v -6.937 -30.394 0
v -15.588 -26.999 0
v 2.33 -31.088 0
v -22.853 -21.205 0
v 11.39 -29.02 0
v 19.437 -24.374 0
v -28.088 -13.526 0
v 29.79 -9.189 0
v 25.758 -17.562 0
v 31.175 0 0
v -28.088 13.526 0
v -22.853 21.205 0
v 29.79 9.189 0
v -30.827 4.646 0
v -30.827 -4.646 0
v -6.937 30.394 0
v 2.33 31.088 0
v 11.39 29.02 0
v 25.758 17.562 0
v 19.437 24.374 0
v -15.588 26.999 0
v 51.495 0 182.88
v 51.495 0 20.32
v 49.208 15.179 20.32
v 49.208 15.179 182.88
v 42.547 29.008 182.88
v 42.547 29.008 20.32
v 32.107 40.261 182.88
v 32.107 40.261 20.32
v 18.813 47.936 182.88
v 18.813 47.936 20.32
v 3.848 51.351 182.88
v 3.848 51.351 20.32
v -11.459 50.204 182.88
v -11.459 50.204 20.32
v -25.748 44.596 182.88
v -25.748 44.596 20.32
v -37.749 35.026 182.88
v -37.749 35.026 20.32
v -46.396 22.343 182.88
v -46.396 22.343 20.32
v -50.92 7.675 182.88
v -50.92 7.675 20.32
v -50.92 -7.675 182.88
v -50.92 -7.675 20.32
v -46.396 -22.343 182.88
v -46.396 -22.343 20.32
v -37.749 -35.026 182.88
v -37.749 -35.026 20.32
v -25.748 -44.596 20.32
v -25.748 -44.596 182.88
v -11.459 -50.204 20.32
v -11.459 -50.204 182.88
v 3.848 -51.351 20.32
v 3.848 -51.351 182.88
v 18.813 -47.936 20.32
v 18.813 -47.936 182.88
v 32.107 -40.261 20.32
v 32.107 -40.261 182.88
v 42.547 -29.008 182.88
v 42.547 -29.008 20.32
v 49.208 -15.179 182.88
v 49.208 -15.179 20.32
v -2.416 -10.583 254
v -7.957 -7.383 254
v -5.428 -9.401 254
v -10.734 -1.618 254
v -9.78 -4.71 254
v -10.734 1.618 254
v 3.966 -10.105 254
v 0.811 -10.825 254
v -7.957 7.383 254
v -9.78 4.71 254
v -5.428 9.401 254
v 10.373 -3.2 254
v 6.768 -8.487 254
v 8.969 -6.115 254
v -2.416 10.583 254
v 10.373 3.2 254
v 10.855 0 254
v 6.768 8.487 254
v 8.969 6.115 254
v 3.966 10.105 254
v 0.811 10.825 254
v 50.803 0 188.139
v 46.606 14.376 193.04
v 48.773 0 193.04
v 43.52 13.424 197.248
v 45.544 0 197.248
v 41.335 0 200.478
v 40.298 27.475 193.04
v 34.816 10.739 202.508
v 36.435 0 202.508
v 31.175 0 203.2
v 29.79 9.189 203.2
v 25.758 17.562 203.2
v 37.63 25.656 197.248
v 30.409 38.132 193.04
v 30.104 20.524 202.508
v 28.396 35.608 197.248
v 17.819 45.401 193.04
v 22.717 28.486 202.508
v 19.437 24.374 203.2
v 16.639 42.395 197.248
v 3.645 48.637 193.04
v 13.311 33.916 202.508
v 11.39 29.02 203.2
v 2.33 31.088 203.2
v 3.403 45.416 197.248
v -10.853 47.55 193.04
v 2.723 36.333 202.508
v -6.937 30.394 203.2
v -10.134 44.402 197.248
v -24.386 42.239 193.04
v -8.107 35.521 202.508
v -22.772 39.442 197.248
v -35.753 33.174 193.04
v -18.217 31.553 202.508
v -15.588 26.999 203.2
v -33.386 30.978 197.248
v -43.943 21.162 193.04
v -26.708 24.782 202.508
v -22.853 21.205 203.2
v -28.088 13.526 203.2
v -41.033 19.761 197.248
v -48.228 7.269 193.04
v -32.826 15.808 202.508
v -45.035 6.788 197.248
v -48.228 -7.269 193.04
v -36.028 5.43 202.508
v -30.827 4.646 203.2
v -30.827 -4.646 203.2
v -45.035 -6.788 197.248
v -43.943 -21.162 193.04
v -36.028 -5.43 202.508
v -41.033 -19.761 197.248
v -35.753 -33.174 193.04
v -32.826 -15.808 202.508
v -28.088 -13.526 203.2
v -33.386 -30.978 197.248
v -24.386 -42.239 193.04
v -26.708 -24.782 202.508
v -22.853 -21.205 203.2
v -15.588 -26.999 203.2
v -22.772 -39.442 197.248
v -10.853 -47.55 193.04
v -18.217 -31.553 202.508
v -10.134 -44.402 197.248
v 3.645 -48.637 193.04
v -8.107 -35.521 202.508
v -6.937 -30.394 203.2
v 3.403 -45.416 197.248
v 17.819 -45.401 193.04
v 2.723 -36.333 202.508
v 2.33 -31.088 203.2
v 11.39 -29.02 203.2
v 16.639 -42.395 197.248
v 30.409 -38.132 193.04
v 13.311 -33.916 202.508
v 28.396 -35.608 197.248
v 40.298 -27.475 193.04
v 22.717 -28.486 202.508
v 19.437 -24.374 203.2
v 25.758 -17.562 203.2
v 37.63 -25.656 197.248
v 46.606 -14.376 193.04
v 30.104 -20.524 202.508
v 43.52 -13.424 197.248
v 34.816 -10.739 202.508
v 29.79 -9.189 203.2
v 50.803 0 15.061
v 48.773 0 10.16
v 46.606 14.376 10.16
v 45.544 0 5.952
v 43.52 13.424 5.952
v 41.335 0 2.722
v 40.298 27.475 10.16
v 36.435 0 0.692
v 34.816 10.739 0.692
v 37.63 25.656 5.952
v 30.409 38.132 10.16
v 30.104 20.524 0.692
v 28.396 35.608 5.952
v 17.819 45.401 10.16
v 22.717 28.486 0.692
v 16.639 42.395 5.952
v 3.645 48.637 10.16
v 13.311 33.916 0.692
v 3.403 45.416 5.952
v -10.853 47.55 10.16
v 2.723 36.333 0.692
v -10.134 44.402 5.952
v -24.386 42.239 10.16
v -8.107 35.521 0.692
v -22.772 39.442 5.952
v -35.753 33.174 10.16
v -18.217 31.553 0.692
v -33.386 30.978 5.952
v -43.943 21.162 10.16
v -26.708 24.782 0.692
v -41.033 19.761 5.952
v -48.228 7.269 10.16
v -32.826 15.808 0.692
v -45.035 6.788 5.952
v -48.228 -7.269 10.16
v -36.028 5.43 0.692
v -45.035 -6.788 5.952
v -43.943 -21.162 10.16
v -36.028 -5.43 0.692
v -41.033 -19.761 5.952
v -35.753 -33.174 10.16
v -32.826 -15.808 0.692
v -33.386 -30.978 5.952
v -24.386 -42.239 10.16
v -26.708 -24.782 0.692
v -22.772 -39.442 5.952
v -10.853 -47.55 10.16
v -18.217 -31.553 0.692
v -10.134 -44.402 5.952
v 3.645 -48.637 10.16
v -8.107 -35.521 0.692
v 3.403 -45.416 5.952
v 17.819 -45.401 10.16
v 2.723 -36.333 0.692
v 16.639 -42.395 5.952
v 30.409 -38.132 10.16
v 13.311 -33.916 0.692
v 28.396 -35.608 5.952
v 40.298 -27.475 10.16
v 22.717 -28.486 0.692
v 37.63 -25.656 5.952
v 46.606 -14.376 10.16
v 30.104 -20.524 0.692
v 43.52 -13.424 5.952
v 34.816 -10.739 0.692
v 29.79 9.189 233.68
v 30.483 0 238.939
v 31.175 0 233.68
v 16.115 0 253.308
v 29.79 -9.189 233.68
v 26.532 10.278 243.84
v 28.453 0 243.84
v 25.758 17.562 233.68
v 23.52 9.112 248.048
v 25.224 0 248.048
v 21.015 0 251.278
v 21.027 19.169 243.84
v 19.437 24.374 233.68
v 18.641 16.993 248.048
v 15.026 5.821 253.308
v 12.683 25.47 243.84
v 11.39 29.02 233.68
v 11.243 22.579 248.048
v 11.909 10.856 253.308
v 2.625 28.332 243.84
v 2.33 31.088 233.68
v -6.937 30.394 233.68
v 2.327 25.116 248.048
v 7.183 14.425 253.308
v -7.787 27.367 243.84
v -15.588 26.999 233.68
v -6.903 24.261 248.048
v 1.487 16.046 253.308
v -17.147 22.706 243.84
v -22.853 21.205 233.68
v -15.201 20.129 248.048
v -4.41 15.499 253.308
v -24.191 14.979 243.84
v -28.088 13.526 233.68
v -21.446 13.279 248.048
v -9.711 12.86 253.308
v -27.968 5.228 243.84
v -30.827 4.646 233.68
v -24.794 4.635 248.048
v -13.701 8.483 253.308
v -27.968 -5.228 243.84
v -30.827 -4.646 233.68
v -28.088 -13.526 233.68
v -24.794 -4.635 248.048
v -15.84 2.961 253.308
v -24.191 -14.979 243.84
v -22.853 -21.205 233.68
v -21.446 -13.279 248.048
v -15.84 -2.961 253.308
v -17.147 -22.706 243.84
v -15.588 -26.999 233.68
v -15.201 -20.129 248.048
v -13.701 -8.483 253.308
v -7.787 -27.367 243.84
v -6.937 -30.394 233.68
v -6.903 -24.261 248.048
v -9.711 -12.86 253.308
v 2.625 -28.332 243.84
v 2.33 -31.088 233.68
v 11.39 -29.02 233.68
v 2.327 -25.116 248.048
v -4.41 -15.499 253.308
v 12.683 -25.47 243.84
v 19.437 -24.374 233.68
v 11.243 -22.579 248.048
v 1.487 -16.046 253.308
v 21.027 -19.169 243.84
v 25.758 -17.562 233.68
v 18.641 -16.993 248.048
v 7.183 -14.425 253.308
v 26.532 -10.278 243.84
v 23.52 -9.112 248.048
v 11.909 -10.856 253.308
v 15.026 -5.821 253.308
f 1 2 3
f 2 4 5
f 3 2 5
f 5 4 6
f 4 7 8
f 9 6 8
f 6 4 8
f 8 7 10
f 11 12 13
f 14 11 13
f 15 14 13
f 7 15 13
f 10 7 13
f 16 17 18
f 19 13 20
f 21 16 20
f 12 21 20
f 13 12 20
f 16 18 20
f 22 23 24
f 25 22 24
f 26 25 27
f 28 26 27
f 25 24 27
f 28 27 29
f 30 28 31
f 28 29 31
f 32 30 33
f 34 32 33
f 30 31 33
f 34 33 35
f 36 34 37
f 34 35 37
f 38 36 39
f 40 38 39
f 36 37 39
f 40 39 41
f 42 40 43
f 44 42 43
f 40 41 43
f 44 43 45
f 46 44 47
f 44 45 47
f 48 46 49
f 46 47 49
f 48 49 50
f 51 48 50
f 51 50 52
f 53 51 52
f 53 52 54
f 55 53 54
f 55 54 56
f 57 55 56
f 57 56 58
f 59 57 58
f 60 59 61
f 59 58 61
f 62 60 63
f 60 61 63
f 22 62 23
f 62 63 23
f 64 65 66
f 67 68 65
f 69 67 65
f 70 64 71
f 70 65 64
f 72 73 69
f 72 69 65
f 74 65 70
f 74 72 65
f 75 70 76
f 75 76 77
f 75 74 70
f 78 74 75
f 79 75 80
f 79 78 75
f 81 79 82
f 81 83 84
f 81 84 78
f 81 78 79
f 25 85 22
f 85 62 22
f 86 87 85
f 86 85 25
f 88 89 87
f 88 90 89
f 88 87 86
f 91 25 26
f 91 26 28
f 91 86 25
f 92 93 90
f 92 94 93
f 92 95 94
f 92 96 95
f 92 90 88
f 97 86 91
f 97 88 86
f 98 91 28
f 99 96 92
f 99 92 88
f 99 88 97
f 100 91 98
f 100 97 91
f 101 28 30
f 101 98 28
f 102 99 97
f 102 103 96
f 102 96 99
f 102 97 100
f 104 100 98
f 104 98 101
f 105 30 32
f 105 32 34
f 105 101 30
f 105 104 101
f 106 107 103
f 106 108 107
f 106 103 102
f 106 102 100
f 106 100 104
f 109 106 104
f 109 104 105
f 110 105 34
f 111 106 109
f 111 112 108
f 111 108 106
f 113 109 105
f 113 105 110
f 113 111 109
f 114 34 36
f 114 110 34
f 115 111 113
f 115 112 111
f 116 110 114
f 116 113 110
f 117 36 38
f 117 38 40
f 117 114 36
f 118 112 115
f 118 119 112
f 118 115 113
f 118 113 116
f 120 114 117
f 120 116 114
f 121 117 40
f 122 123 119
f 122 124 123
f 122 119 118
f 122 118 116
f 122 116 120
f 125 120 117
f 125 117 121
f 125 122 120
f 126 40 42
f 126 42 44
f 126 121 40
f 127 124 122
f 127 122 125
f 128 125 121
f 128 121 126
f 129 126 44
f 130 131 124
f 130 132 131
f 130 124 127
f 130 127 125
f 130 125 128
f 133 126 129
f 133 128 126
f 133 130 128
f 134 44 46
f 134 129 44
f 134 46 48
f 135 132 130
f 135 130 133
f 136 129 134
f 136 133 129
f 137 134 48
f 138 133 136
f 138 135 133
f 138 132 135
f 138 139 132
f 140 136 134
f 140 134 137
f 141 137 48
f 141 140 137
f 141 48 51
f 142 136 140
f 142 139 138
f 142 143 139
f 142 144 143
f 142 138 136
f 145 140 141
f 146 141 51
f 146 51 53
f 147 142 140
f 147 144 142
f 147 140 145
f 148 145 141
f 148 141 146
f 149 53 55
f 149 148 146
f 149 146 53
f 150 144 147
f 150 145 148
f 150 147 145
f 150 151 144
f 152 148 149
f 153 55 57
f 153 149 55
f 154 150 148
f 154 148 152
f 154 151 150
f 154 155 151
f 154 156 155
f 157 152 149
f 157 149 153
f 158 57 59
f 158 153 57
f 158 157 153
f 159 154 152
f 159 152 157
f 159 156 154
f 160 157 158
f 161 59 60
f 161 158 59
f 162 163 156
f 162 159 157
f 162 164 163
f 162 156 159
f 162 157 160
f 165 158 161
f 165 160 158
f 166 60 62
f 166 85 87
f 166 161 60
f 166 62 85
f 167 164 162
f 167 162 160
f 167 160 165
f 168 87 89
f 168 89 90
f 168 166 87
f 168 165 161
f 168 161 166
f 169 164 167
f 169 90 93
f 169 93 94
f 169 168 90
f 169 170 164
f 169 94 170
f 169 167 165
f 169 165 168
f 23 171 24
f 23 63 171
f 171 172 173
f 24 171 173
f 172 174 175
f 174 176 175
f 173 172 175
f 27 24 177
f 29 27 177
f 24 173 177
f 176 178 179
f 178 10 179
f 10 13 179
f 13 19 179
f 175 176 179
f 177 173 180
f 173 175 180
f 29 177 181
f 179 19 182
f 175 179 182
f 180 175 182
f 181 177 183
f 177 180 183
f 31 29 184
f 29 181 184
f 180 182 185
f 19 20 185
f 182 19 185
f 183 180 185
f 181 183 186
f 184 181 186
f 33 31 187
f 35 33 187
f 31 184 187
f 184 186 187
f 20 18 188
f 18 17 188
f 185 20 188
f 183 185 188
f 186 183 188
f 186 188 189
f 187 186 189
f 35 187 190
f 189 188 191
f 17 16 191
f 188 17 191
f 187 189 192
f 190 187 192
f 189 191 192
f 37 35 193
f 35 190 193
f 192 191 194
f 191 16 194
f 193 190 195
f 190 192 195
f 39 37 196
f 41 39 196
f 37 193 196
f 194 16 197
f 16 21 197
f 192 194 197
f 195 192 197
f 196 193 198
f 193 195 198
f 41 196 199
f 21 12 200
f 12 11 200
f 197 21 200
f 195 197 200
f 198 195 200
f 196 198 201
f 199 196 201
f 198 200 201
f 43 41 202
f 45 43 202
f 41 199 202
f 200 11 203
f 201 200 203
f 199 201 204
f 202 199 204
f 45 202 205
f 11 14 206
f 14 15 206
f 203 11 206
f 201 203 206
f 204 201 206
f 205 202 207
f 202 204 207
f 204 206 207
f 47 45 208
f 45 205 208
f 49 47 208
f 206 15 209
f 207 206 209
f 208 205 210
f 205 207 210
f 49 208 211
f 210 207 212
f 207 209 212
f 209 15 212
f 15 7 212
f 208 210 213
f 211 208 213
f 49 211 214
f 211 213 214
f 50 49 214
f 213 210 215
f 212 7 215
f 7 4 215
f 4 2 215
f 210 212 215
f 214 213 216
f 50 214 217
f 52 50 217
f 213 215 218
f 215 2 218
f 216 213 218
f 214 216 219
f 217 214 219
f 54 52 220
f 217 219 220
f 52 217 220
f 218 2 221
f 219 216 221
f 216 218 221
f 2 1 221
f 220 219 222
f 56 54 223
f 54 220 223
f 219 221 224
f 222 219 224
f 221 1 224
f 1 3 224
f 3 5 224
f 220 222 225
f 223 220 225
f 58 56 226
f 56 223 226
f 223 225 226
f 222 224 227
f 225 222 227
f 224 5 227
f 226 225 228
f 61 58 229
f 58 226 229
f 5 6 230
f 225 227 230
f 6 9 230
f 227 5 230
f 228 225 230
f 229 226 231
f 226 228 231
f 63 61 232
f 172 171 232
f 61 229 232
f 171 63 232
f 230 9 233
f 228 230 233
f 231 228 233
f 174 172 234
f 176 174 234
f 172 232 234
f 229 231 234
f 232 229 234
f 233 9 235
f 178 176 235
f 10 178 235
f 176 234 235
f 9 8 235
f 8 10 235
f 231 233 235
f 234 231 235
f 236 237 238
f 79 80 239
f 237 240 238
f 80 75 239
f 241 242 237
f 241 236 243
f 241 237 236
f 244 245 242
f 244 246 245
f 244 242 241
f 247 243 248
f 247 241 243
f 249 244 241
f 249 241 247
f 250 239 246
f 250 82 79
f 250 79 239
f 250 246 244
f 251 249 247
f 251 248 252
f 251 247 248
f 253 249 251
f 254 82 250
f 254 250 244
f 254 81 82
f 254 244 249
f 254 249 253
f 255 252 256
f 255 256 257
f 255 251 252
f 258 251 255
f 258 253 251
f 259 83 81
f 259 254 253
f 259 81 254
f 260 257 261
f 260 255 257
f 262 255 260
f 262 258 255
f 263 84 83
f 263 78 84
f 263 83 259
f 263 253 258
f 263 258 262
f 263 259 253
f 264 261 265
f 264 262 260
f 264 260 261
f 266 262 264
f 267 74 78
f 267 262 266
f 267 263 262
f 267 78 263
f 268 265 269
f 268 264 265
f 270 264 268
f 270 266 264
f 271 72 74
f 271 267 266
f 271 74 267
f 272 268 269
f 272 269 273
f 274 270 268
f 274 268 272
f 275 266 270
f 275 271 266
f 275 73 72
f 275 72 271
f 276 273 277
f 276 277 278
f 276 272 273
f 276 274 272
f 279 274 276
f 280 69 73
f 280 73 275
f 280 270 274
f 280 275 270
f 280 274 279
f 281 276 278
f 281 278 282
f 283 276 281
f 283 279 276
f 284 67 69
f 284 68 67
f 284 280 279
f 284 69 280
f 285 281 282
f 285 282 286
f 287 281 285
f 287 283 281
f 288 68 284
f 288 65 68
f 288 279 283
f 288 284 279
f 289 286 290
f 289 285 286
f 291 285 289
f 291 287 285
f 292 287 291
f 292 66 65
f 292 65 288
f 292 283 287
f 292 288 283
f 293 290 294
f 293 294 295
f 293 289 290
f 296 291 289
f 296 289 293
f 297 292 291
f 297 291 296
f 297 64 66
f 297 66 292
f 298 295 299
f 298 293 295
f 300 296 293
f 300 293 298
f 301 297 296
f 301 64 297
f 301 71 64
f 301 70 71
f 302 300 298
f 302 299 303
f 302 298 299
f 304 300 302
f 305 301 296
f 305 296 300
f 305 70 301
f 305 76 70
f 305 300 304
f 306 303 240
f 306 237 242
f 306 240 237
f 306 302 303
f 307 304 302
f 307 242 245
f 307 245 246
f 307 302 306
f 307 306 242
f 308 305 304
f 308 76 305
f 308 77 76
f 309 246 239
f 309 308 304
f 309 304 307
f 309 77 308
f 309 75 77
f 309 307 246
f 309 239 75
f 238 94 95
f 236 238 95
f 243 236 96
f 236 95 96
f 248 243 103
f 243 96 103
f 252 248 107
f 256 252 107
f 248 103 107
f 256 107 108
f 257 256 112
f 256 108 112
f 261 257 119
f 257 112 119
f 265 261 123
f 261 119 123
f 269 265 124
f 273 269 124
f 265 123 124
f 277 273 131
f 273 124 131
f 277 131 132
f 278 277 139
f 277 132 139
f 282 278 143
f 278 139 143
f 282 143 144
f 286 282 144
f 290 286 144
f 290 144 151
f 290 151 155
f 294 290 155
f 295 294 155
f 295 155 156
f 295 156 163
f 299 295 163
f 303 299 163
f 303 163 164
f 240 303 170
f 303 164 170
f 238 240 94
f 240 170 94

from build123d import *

# Parameters (mm, degrees)
F0_R     = 51.4953011057
F1_DEPTH = 203.2
F2_R     = 20.32
F3_DEPTH = 50.8
F4_R     = 20.32


with BuildPart() as f1:
    # F0 (on Top) → F1 (new body)
    with BuildSketch(Plane.XY):
        Circle(F0_R)
    extrude(amount=F1_DEPTH)

    # F2
    f2_edges = [f1.edges().sort_by_distance(p)[0] for p in [
        (-51.495301, 0, 0),
        (-51.495301, 0, 203.2),
    ]]
    fillet(f2_edges, radius=F2_R)

    # F3 (add): a face of the model
    f3_faces = [f1.faces().sort_by_distance(p)[0] for p in [
        (0, 0, 203.2),
    ]]
    extrude(f3_faces, amount=F3_DEPTH)

    # F4
    f4_edges = [f1.edges().sort_by_distance(p)[0] for p in [
        (-31.175301, 0, 254),
    ]]
    fillet(f4_edges, radius=F4_R)


solid = f1.part
